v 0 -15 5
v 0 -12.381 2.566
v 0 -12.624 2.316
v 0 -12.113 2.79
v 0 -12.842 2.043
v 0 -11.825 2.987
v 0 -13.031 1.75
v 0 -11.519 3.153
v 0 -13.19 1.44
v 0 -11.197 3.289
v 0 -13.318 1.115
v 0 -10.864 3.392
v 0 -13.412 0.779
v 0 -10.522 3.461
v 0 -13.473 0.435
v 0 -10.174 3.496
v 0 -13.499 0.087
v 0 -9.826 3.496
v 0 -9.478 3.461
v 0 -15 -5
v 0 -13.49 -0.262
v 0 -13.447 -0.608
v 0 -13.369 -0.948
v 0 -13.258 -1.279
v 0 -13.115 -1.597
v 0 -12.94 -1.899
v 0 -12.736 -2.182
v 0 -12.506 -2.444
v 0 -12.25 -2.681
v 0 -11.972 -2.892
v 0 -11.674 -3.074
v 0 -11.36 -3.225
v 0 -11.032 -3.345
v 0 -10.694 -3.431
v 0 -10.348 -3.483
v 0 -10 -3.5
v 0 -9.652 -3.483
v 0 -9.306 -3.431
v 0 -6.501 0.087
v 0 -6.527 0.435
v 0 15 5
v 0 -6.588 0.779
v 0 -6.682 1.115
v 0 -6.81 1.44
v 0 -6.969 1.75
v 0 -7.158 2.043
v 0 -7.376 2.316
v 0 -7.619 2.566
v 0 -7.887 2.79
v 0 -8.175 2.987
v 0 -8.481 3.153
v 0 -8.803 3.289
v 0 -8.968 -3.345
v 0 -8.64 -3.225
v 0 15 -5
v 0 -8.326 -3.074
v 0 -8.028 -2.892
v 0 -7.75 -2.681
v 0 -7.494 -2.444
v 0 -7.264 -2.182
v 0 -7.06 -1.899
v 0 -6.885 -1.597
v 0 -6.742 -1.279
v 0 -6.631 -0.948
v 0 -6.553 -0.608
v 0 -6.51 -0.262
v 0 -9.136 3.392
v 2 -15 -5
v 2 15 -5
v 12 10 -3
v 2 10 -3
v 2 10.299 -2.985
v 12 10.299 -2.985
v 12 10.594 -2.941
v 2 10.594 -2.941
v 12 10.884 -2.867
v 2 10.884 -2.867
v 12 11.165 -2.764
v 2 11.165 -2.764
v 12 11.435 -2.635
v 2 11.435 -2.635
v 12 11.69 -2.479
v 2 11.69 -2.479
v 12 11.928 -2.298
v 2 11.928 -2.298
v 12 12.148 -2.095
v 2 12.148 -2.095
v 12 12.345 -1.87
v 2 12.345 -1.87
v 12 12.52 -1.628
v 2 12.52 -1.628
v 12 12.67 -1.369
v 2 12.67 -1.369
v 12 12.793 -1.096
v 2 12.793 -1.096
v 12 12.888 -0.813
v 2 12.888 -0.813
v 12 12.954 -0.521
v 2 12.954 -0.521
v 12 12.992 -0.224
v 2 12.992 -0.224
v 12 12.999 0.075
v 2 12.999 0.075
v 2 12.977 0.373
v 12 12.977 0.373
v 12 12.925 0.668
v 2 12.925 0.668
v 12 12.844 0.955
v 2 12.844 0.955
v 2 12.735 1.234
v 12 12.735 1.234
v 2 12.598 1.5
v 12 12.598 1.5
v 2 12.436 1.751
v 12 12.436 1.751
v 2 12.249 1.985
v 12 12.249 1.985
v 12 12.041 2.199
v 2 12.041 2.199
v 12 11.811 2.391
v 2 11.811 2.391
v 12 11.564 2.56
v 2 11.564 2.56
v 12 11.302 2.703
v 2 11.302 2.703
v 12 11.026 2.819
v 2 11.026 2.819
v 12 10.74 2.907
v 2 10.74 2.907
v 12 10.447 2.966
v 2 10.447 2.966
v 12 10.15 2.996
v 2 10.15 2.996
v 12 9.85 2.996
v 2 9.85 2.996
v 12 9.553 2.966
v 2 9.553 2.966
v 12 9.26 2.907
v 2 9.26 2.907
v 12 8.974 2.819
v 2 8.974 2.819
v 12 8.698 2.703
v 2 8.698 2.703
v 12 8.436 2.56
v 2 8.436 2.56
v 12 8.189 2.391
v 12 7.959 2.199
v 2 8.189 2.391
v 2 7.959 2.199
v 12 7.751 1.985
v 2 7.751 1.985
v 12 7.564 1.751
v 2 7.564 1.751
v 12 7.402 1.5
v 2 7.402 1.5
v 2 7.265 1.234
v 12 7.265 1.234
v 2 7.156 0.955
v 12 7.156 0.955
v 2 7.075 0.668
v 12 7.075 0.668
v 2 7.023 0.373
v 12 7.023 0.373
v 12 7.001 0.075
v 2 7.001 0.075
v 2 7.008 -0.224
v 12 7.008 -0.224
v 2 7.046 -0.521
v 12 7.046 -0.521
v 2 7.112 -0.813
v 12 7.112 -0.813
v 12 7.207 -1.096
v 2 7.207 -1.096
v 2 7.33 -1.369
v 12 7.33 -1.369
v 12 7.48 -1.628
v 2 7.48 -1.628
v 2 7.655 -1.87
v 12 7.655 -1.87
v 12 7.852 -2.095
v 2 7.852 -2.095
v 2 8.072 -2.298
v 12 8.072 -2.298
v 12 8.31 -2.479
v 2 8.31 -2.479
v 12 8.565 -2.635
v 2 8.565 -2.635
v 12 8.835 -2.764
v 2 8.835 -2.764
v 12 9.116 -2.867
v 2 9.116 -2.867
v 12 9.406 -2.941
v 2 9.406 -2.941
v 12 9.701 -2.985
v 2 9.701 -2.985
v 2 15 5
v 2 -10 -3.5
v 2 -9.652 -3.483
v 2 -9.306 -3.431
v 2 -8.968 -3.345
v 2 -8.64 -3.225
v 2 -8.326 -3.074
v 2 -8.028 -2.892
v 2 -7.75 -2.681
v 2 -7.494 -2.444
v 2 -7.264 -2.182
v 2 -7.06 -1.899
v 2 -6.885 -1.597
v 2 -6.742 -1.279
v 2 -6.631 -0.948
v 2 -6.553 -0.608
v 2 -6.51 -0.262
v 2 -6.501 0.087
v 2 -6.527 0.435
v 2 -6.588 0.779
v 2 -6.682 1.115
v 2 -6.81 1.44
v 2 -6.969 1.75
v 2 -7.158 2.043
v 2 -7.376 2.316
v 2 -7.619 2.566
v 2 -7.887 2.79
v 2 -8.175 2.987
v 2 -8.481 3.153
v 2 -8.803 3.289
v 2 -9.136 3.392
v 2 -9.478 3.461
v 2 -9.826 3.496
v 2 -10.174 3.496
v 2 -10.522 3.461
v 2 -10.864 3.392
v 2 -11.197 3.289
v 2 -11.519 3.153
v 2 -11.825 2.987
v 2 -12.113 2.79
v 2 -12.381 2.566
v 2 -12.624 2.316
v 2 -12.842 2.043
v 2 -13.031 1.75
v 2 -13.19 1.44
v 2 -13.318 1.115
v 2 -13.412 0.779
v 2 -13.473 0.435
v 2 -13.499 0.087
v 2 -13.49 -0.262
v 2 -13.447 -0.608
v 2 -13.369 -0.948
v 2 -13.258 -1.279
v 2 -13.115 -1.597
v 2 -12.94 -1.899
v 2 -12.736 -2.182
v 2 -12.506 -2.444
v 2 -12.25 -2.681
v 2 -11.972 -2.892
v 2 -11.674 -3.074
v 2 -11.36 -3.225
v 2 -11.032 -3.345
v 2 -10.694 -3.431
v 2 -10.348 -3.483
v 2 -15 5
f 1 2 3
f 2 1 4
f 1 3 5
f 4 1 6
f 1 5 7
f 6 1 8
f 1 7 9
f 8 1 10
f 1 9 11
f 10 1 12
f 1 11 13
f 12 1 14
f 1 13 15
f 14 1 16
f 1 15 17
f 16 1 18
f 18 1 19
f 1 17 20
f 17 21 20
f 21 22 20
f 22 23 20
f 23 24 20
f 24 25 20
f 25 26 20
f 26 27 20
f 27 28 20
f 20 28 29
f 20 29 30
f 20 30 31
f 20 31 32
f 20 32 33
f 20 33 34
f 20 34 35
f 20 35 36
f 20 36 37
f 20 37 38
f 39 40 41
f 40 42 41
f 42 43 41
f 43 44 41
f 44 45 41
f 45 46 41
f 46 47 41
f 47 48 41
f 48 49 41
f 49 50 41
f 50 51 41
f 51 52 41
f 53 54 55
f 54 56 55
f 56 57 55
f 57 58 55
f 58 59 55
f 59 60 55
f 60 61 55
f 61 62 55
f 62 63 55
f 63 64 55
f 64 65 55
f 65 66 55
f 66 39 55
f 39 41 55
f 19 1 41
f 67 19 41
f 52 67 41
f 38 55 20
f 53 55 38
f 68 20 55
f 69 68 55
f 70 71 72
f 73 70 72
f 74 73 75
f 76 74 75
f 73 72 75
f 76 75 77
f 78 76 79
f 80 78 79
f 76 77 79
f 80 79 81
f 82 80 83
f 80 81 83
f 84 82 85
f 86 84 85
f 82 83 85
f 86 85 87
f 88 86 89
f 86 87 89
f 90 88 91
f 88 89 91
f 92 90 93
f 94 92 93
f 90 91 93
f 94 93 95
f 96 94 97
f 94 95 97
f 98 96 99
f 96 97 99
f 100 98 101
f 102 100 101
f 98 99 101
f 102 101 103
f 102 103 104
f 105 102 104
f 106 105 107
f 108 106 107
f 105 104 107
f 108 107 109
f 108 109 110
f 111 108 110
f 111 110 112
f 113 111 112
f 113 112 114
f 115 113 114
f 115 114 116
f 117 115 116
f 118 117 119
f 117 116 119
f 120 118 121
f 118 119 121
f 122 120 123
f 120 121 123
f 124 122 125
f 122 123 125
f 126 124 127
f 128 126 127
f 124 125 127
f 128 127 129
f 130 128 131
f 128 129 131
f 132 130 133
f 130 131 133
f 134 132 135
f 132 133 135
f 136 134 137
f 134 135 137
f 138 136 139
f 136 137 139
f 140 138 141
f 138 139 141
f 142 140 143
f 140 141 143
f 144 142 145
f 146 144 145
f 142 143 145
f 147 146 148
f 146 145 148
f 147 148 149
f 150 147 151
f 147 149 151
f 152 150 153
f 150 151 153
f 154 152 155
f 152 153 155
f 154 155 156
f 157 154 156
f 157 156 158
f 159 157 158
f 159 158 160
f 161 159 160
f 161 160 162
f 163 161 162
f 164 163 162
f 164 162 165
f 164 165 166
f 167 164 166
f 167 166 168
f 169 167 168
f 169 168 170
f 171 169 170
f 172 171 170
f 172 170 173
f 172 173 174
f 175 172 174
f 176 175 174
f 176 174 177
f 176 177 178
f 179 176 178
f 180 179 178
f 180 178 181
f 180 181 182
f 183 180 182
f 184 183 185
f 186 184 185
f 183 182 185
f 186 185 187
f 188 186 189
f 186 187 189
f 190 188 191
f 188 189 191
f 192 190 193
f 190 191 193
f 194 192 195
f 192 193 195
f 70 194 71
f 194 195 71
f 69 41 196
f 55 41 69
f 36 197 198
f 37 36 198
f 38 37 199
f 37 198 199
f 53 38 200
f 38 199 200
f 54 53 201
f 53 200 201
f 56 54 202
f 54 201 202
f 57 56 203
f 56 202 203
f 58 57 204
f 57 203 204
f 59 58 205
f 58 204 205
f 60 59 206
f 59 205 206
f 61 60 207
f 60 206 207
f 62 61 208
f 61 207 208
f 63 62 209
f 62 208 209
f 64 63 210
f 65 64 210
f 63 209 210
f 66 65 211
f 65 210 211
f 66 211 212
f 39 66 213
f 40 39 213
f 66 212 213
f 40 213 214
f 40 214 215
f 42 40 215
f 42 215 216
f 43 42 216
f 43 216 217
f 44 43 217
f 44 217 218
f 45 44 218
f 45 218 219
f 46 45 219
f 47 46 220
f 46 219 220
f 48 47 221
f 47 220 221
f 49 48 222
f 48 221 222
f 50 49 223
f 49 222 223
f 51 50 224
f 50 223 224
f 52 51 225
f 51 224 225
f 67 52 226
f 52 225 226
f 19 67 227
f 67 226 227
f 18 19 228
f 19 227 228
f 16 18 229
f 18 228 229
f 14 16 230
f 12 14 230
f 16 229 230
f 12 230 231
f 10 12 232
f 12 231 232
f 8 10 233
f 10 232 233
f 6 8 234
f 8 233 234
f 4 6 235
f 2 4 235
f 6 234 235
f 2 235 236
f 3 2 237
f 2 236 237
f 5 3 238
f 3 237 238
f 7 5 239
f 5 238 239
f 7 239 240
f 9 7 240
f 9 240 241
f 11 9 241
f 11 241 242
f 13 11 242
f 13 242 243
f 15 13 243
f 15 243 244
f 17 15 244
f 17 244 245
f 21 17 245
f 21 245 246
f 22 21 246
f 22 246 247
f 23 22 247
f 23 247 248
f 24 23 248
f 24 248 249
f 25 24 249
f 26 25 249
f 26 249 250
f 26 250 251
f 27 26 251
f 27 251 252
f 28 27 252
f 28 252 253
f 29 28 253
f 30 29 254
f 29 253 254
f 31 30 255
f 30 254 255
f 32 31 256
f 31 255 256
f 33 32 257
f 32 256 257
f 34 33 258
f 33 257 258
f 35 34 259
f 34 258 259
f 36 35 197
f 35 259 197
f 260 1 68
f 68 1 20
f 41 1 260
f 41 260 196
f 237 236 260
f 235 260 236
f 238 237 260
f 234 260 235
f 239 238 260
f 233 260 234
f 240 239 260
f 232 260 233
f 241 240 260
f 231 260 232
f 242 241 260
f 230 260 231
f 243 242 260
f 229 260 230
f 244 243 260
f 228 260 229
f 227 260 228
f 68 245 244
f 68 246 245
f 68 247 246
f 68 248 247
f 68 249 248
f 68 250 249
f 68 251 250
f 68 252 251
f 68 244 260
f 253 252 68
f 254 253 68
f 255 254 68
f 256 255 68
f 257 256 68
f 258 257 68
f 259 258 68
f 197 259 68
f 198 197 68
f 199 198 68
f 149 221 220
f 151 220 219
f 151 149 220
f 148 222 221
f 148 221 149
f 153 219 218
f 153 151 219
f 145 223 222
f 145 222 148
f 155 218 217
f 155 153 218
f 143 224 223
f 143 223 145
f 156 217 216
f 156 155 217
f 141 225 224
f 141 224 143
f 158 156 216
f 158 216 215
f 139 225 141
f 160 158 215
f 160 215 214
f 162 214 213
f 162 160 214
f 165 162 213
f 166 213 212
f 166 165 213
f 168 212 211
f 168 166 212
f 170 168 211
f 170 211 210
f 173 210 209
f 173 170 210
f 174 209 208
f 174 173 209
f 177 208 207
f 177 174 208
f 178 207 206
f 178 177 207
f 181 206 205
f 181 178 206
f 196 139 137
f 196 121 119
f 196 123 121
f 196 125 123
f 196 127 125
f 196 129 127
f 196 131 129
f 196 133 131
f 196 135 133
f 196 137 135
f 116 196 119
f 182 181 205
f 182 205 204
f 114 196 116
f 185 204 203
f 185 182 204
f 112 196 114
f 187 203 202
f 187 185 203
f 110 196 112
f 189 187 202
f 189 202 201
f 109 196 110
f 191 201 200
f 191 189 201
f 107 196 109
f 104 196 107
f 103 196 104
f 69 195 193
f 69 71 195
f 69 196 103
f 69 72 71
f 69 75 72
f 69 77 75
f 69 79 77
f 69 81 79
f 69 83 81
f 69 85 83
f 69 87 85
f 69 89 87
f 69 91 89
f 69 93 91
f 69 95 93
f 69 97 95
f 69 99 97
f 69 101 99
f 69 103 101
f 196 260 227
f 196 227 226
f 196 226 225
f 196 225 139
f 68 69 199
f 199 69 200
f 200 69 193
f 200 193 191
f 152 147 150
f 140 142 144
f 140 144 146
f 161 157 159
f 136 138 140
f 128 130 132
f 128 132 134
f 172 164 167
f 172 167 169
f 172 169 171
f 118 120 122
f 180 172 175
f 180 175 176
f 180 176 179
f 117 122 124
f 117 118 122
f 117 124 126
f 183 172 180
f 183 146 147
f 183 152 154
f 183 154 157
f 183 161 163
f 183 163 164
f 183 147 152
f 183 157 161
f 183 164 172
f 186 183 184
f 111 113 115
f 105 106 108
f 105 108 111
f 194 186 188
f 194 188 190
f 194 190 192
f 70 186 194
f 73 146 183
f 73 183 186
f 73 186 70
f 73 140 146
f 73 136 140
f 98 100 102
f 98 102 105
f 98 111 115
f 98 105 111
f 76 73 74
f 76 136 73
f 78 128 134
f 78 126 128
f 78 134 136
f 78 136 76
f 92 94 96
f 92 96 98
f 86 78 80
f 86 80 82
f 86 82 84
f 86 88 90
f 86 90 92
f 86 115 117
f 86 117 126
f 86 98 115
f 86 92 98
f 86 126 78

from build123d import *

# Parameters (mm, degrees)
SKETCH1_W           = 10
SKETCH1_H           = 30
BOSS_EXTRUDE1_DEPTH = 2
SKETCH2_R           = 3.5
CUT_EXTRUDE1_DEPTH  = 2
SKETCH3_R           = 3
BOSS_EXTRUDE2_DEPTH = 10


with BuildPart() as part:
    # Sketch1 → Boss-Extrude1 (new body)
    with BuildSketch(Plane(origin=(0, 0, 0), x_dir=(0, 0, -1), z_dir=(1, 0, 0))):
        Rectangle(SKETCH1_W, SKETCH1_H)
    extrude(amount=BOSS_EXTRUDE1_DEPTH)

    # Sketch2 → Cut-Extrude1 (cut)
    with BuildSketch(Plane(origin=(2, 0, 0), x_dir=(0, 0, -1), z_dir=(1, 0, 0))):
        with Locations((0, -10)):
            Circle(SKETCH2_R)
    extrude(amount=-CUT_EXTRUDE1_DEPTH, mode=Mode.SUBTRACT)

    # Sketch3 → Boss-Extrude2 (add)
    with BuildSketch(Plane(origin=(2, 0, 0), x_dir=(0, 0, -1), z_dir=(1, 0, 0))):
        with Locations((0, 10)):
            Circle(SKETCH3_R)
    extrude(amount=BOSS_EXTRUDE2_DEPTH)


solid = part.part
